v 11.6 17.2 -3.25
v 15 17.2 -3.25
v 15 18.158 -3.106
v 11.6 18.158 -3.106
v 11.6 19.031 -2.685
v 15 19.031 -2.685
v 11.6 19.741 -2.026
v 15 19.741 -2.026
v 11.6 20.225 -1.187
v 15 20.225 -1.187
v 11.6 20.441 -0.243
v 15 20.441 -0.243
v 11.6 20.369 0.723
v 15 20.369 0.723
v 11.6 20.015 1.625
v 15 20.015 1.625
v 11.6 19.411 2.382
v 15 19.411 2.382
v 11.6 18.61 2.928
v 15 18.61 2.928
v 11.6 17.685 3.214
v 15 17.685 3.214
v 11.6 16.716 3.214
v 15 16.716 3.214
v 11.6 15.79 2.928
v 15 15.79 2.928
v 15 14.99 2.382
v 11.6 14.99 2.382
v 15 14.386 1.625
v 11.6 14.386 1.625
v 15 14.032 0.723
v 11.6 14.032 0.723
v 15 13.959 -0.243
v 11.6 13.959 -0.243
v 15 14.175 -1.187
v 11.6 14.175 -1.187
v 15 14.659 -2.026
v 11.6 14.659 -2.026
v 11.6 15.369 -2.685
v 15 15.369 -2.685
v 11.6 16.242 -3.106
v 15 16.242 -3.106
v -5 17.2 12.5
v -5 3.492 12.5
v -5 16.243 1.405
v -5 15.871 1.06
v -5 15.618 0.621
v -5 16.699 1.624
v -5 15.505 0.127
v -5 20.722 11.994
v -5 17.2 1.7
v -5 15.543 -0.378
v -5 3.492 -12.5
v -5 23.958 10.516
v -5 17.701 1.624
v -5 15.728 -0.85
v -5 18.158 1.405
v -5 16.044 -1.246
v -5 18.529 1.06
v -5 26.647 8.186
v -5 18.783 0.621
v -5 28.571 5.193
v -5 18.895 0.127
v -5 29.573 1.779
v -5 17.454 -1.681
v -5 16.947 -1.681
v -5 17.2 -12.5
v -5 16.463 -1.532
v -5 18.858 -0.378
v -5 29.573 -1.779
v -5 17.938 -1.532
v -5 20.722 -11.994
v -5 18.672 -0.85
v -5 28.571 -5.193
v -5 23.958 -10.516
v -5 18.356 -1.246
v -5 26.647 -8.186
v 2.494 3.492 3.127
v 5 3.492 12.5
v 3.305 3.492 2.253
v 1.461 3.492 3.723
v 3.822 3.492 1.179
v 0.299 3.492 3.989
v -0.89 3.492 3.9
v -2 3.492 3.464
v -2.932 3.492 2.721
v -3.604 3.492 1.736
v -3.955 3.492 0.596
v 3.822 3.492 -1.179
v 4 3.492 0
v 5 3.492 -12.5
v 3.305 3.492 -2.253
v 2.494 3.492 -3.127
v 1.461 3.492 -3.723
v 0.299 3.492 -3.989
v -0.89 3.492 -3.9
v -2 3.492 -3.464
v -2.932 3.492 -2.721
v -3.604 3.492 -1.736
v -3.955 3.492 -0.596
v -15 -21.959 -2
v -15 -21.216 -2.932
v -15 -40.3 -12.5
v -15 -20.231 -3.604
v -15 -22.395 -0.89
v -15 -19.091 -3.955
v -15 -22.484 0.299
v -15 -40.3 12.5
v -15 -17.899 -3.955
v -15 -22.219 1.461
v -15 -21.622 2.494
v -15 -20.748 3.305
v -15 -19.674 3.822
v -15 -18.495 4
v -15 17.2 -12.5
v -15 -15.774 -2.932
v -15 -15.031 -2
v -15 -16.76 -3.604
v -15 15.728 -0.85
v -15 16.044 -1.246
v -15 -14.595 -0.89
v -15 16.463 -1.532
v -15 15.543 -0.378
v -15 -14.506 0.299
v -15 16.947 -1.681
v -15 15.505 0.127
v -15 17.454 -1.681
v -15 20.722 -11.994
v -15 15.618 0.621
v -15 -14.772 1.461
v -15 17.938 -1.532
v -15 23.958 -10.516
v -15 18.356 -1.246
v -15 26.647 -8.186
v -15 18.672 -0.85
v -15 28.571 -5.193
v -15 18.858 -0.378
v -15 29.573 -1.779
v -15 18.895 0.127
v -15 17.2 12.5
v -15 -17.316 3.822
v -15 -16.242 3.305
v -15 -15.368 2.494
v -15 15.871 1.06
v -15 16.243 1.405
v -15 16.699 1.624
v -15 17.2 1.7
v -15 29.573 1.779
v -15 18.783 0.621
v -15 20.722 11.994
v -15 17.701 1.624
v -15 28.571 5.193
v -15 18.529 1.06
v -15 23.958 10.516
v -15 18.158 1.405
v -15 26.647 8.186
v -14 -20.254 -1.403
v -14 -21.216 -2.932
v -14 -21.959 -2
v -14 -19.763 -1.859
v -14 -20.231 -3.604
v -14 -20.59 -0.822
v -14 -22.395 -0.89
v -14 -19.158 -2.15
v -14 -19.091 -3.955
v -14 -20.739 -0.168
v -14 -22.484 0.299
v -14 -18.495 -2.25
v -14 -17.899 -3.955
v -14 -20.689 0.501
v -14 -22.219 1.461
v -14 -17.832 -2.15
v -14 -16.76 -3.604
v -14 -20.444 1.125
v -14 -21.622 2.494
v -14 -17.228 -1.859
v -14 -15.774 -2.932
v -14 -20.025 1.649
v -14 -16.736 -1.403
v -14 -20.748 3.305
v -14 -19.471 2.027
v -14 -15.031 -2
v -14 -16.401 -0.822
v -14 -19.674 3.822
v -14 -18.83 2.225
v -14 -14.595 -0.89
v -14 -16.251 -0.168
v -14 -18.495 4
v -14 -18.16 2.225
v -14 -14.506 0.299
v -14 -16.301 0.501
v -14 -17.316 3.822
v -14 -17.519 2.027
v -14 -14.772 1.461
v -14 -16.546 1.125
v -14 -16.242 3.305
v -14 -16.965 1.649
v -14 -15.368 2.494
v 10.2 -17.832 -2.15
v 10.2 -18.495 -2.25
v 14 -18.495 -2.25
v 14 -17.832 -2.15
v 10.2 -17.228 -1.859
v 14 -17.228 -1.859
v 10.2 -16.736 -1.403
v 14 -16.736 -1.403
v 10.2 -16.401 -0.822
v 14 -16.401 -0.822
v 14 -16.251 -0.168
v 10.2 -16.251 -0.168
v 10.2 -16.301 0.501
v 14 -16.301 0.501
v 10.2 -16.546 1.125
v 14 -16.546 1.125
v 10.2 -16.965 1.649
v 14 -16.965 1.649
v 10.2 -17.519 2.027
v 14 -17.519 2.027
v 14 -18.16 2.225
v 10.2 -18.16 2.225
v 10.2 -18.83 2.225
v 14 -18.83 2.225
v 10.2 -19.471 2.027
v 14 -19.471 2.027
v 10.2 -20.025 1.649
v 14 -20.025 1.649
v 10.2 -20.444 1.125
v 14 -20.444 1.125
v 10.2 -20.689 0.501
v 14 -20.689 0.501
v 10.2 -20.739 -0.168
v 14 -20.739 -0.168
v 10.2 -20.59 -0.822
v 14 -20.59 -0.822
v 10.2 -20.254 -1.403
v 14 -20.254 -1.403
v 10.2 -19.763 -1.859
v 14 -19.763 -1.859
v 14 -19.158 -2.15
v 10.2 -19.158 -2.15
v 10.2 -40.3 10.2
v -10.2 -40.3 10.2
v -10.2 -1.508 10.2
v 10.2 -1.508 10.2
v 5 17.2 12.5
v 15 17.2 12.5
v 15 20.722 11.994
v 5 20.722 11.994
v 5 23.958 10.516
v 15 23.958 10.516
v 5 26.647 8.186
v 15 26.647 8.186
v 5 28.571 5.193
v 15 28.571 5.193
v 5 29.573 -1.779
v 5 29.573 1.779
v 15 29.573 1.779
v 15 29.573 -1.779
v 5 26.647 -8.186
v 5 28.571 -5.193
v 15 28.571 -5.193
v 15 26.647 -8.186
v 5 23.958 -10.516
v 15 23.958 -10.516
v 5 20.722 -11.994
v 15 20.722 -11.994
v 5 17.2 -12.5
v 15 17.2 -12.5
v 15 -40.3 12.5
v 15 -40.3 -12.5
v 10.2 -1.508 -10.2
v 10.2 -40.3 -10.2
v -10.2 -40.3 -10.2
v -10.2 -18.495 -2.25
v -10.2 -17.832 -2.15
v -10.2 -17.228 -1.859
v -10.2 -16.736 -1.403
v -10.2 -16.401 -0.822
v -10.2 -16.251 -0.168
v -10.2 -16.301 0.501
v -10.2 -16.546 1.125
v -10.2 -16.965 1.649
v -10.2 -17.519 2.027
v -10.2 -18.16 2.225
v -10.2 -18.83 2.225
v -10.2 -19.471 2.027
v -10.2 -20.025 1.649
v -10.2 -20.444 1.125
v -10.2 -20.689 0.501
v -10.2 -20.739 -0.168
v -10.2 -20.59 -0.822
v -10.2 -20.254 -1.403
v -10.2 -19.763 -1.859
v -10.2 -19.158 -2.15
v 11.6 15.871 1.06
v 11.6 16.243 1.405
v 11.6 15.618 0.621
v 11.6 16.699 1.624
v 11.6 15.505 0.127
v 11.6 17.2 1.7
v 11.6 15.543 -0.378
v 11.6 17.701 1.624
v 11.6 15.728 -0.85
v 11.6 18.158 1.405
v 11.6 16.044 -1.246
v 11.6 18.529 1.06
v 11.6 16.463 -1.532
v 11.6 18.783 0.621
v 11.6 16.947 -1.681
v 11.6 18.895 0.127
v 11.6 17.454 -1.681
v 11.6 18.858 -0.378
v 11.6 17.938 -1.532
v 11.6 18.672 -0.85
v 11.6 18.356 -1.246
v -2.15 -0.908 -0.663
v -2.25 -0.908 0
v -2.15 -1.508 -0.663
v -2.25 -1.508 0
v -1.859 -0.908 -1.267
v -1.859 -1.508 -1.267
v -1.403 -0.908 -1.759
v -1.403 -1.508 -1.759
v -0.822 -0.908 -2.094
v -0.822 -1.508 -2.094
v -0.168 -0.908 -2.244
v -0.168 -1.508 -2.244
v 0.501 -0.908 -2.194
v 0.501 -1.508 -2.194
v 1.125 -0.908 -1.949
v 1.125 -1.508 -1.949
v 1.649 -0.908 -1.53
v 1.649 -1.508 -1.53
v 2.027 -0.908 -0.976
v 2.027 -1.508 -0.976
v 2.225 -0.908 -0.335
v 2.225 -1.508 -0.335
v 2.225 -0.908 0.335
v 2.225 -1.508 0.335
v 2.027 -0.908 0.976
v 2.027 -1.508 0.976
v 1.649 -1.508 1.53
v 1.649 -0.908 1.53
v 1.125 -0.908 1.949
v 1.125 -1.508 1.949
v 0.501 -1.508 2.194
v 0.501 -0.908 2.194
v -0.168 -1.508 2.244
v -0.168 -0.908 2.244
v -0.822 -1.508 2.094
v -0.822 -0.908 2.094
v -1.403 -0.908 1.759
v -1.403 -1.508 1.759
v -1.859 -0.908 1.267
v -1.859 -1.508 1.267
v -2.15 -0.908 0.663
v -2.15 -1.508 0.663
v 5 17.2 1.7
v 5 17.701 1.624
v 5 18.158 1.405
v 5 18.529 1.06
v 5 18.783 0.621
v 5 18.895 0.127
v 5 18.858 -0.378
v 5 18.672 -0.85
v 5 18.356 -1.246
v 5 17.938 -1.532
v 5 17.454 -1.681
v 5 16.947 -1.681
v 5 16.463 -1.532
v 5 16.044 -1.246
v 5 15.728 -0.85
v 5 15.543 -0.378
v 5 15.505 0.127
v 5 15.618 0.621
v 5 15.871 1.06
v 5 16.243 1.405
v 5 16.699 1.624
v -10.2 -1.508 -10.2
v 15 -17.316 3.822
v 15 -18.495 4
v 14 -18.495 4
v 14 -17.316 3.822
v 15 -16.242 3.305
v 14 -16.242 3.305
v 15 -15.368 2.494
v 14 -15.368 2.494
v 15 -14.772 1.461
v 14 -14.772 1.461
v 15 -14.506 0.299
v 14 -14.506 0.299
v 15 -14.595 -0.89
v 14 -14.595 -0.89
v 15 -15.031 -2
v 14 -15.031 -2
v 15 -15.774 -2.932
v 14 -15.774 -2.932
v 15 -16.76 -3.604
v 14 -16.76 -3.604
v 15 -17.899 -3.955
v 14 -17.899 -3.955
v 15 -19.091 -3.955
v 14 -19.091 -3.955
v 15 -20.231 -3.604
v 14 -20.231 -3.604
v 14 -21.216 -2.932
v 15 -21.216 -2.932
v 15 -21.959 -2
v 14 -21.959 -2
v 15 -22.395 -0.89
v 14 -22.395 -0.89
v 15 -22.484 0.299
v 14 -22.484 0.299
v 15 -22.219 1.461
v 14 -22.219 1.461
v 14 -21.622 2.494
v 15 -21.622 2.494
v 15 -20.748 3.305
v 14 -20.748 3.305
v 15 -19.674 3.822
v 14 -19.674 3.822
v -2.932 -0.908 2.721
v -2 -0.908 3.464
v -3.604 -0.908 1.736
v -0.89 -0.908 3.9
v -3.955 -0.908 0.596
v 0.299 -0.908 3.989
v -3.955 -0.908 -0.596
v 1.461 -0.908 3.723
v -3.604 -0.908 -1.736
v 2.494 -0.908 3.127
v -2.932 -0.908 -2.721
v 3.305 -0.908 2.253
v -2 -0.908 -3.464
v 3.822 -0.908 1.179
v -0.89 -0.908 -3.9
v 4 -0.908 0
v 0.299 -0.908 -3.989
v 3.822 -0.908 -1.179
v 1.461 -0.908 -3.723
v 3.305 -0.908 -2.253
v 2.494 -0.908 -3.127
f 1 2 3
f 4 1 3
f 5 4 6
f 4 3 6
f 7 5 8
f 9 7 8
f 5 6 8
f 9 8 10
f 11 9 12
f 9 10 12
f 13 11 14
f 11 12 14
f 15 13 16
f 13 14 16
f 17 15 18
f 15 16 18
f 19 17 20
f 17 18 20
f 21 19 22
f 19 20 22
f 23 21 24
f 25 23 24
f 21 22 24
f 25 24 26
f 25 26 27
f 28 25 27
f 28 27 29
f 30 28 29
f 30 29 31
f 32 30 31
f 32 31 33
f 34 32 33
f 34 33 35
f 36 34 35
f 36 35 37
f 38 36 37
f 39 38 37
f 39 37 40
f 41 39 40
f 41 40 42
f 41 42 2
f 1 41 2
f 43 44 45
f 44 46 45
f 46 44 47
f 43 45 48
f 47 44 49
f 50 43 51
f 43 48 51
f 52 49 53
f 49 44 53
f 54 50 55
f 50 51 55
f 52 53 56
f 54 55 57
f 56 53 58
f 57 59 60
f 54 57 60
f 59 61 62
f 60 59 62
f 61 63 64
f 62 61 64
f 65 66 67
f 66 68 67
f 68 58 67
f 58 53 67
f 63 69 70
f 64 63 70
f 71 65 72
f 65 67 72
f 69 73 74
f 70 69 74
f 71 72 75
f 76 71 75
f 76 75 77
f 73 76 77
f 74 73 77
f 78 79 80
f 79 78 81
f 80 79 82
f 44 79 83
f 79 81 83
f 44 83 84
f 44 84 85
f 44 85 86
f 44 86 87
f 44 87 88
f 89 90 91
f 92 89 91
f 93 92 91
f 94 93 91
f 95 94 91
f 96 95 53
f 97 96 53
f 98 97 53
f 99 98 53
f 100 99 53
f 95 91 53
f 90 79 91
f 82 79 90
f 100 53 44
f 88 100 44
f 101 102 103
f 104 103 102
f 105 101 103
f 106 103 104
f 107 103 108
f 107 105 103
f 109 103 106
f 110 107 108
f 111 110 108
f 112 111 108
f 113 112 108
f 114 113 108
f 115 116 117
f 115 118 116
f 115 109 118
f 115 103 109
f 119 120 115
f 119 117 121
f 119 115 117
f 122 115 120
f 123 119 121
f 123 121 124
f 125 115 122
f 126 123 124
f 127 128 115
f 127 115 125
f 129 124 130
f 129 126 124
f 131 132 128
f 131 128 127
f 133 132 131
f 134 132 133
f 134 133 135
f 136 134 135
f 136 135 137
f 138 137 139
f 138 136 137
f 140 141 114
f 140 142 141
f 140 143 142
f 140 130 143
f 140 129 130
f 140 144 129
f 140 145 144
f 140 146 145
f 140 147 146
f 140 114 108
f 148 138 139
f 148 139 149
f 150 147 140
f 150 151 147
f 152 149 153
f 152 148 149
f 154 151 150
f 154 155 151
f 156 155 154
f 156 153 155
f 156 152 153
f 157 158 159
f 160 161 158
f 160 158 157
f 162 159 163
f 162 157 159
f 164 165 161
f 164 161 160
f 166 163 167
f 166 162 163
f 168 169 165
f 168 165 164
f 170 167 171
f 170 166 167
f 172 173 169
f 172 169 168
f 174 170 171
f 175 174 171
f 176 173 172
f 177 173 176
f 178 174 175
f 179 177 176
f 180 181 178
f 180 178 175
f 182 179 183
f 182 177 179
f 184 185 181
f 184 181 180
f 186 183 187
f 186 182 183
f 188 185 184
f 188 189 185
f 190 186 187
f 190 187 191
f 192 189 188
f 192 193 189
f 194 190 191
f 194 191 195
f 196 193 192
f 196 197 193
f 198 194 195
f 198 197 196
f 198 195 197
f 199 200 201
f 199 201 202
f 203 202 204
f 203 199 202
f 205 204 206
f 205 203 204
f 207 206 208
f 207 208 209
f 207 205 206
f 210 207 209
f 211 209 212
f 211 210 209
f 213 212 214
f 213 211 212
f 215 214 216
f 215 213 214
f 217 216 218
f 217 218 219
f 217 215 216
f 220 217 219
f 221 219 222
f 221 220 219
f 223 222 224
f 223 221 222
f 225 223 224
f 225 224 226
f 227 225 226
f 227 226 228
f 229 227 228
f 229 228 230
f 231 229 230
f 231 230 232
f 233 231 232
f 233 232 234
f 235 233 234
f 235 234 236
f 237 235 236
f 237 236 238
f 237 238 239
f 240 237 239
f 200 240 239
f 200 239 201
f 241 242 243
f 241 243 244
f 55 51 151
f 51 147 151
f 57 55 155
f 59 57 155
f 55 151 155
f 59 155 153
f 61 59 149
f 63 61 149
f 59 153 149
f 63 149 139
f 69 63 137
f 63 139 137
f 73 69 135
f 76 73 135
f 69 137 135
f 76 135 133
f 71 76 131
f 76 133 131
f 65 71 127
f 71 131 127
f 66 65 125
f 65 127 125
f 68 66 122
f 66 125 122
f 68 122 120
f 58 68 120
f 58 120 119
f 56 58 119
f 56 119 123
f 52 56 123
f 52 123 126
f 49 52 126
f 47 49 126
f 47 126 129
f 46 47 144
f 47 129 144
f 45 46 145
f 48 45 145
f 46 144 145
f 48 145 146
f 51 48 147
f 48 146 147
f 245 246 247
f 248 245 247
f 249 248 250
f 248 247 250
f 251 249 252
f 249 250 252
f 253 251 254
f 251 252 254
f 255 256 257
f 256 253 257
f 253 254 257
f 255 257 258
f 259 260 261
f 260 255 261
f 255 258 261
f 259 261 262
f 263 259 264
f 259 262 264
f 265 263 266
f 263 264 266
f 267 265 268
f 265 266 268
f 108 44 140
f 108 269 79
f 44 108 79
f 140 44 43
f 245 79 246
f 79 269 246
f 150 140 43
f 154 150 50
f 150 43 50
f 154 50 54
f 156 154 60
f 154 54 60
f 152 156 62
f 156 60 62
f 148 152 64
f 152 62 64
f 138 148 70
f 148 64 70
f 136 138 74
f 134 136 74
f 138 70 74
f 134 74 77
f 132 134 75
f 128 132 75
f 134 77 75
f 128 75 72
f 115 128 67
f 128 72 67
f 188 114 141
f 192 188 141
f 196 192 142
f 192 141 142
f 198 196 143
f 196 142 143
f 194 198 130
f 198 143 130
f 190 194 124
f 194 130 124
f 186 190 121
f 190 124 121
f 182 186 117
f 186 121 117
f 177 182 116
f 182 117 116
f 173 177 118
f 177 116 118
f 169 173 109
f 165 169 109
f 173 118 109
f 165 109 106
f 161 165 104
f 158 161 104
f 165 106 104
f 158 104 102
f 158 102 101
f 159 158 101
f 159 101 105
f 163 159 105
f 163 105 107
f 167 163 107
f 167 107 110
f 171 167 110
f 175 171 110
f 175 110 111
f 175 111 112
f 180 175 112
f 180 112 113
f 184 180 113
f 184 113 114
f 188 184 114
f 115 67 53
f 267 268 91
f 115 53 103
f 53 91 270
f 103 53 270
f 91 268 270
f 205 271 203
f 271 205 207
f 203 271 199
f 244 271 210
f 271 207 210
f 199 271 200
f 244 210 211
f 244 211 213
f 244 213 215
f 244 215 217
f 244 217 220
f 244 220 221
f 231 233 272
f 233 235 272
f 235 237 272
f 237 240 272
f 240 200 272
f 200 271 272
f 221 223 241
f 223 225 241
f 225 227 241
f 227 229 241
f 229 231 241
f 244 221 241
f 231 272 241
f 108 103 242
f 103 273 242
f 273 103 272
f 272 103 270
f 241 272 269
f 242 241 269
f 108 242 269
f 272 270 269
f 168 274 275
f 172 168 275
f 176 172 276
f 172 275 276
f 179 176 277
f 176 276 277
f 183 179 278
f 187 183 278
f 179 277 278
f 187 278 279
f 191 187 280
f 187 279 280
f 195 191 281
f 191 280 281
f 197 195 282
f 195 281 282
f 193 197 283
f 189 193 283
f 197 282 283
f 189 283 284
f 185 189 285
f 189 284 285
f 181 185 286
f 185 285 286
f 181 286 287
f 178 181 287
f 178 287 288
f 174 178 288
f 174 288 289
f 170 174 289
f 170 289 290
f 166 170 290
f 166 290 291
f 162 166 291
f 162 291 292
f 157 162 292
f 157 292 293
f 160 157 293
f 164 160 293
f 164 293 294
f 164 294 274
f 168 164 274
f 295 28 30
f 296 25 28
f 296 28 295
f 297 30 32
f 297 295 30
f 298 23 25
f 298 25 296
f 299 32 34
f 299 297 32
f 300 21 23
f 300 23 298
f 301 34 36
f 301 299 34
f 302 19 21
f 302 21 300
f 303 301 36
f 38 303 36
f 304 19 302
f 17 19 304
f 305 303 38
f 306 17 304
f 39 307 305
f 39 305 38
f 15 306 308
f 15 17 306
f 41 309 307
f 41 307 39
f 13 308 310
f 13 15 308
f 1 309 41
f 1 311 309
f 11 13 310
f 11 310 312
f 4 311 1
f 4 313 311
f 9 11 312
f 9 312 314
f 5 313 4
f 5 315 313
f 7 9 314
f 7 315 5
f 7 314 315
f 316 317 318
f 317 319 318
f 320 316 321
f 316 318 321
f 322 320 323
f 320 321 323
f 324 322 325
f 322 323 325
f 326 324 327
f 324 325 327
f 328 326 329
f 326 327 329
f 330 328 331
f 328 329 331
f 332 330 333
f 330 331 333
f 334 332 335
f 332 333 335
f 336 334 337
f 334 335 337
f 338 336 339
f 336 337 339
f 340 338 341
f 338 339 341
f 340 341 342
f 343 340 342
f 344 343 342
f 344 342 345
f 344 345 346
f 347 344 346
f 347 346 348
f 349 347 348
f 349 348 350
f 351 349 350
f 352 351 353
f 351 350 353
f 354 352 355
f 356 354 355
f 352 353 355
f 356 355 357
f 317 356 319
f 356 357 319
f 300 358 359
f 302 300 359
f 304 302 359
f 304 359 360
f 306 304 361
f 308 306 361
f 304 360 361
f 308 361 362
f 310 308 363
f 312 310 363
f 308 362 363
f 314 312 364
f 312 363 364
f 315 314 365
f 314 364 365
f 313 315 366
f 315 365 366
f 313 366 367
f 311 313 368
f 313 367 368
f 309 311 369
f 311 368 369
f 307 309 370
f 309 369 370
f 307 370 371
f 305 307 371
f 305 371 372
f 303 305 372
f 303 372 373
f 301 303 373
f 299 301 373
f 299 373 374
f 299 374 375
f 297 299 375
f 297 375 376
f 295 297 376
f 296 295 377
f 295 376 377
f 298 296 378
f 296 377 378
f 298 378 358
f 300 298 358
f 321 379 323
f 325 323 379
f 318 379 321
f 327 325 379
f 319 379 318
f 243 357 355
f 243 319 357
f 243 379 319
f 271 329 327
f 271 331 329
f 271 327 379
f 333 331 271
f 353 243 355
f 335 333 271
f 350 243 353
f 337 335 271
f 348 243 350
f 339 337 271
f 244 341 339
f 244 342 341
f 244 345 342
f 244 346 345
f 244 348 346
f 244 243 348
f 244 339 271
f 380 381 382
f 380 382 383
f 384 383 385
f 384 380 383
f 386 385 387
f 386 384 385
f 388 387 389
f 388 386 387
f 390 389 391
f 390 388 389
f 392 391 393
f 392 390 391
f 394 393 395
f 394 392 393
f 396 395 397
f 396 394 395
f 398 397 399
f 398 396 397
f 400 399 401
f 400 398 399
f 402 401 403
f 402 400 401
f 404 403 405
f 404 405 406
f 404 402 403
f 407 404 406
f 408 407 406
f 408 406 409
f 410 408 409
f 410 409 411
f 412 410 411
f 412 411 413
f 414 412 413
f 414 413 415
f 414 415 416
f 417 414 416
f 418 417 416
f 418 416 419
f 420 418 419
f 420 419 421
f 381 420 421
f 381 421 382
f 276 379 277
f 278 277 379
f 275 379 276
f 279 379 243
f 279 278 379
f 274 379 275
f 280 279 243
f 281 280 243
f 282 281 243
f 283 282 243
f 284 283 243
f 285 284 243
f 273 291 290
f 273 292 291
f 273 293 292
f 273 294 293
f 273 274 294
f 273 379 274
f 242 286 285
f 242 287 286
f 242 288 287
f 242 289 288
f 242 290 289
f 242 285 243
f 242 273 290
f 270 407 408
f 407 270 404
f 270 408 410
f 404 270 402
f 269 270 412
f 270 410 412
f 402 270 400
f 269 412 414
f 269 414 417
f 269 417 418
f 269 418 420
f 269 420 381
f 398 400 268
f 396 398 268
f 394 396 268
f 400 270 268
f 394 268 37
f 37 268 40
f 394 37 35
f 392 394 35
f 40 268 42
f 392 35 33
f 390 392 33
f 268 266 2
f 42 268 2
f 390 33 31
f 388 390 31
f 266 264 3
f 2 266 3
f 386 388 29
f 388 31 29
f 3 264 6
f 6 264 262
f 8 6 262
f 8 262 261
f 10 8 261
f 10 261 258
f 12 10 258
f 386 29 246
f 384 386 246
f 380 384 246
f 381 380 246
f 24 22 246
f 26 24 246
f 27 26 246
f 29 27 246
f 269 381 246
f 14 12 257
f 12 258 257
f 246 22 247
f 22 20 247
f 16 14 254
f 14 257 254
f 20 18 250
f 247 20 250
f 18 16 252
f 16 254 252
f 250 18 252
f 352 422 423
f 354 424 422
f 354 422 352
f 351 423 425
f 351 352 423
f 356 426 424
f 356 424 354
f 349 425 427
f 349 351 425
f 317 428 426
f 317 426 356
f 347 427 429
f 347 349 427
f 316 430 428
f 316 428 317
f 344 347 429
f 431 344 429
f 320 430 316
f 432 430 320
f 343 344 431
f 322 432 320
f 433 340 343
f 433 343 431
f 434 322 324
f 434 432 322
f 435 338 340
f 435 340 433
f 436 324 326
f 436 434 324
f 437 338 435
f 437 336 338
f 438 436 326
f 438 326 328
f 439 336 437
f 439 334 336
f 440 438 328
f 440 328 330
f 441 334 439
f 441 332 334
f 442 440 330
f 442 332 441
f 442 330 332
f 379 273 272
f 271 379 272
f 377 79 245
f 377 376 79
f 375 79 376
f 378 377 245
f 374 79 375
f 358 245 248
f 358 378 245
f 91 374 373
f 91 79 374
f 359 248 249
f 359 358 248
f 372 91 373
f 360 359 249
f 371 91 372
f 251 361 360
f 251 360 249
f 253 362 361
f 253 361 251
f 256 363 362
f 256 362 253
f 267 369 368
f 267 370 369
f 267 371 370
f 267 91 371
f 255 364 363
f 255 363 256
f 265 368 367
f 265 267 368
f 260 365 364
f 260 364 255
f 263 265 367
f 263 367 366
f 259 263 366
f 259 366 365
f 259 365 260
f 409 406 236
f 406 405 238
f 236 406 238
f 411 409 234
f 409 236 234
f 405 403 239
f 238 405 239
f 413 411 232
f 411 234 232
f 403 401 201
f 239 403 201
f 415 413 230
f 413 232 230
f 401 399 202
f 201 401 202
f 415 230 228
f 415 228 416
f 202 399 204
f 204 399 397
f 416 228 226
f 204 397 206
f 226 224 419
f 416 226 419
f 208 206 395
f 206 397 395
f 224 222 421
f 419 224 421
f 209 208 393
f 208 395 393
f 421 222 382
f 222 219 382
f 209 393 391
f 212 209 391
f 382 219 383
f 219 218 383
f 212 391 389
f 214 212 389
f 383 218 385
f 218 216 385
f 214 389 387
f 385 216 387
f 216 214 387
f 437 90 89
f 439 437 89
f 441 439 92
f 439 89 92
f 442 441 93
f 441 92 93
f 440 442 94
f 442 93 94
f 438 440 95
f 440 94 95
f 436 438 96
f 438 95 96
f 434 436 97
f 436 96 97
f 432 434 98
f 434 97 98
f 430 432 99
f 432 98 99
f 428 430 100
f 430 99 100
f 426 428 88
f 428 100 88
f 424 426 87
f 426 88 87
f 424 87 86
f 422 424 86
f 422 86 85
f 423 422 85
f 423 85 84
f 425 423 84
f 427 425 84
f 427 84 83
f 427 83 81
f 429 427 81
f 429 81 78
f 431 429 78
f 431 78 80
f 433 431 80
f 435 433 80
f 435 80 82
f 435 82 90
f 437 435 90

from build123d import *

# Parameters (mm, degrees)
BOSS_EXTRU_1_DEPTH                                 = 15
CHAMBRAGE_POUR_VIS_T_TE_HEXAGONALE_M31_D           = 3.4
CHAMBRAGE_POUR_VIS_T_TE_HEXAGONALE_M31_CBORE_D     = 6.5
CHAMBRAGE_POUR_VIS_T_TE_HEXAGONALE_M31_CBORE_DEPTH = 3.4
ENL_V_MAT_EXTRU_2_REACH                            = 51.74
ESQUISSE3_W                                        = 10
ESQUISSE3_H                                        = 26.208058997
ESQUISSE2_W                                        = 20.4
ESQUISSE2_H                                        = 20.4
ENL_V_MAT_EXTRU_1_DEPTH                            = 38.791941003
CHAMBRAGE_POUR_VIS_T_TE_HEXAGONALE_M42_D           = 4.5
CHAMBRAGE_POUR_VIS_T_TE_HEXAGONALE_M42_DEPTH       = 4.8
CHAMBRAGE_POUR_VIS_T_TE_HEXAGONALE_M42_CBORE_D     = 8
CHAMBRAGE_POUR_VIS_T_TE_HEXAGONALE_M42_CBORE_DEPTH = 1
CHAMBRAGE_POUR_VIS_T_TE_HEXAGONALE_M43_D           = 4.5
CHAMBRAGE_POUR_VIS_T_TE_HEXAGONALE_M43_CBORE_D     = 8
CHAMBRAGE_POUR_VIS_T_TE_HEXAGONALE_M43_CBORE_DEPTH = 4.4


with BuildPart() as part:
    # Esquisse1 → Boss.-Extru.1 (new, symmetric)
    with BuildSketch(Plane(origin=(0, 0, 0), x_dir=(0, 0, -1), z_dir=(1, 0, 0))):
        with BuildLine():
            Line((-12.5, -40.299852287), (-12.5, 17.200147713))
            ThreePointArc((-12.5, 17.200147713), (0, 29.700147713), (12.5, 17.200147713))
            Line((12.5, 17.200147713), (12.5, -40.299852287))
            Line((12.5, -40.299852287), (-12.5, -40.299852287))
        make_face()
    extrude(amount=BOSS_EXTRU_1_DEPTH, both=True)

    # Chambrage pour vis à tête hexagonale M31 (through all)
    with Locations(Plane(origin=(15, 0, 0), x_dir=(0, 0, -1), z_dir=(1, 0, 0))):
        with Locations((0, 17.200147713)):
            CounterBoreHole(CHAMBRAGE_POUR_VIS_T_TE_HEXAGONALE_M31_D / 2, CHAMBRAGE_POUR_VIS_T_TE_HEXAGONALE_M31_CBORE_D / 2, CHAMBRAGE_POUR_VIS_T_TE_HEXAGONALE_M31_CBORE_DEPTH)

    # Esquisse3 → Enlèv. mat.-Extru.2 (cut, up to next)
    with BuildSketch(Plane(origin=(0, 0, -12.5), x_dir=(-1, 0, 0), z_dir=(0, 0, -1)), mode=Mode.PRIVATE) as enl_v_mat_extru_2_sk1:
        with Locations((0, 16.596118215)):
            Rectangle(ESQUISSE3_W, ESQUISSE3_H)
    enl_v_mat_extru_2_tool1 = extrude(enl_v_mat_extru_2_sk1.sketch, amount=-ENL_V_MAT_EXTRU_2_REACH, mode=Mode.PRIVATE) & part.part
    add(enl_v_mat_extru_2_tool1.solids().sort_by_distance((0, 16.596118, -12.5))[0], mode=Mode.SUBTRACT)

    # Esquisse2 → Enlèv. mat.-Extru.1 (cut)
    with BuildSketch(Plane.XZ.offset(40.299852287)):
        Rectangle(ESQUISSE2_W, ESQUISSE2_H)
    extrude(amount=-ENL_V_MAT_EXTRU_1_DEPTH, mode=Mode.SUBTRACT)

    # Chambrage pour vis à tête hexagonale M42
    with Locations(Plane.ZY.offset(15)):
        with Locations((0, -18.495042181)):
            chambrage_pour_vis_t_te_hexagonale_m42 = CounterBoreHole(CHAMBRAGE_POUR_VIS_T_TE_HEXAGONALE_M42_D / 2, CHAMBRAGE_POUR_VIS_T_TE_HEXAGONALE_M42_CBORE_D / 2, CHAMBRAGE_POUR_VIS_T_TE_HEXAGONALE_M42_CBORE_DEPTH, depth=CHAMBRAGE_POUR_VIS_T_TE_HEXAGONALE_M42_DEPTH)

    # Chambrage pour vis à tête hexagonale M43 (through all)
    with Locations(Plane(origin=(0, 3.492088716, 0), x_dir=(1, 0, 0), z_dir=(0, 1, 0))):
        with Locations((0, 0)):
            CounterBoreHole(CHAMBRAGE_POUR_VIS_T_TE_HEXAGONALE_M43_D / 2, CHAMBRAGE_POUR_VIS_T_TE_HEXAGONALE_M43_CBORE_D / 2, CHAMBRAGE_POUR_VIS_T_TE_HEXAGONALE_M43_CBORE_DEPTH)

    # Symétrie1: Chambrage pour vis à tête hexagonale M42 across plane
    add(chambrage_pour_vis_t_te_hexagonale_m42.mirror(Plane(origin=(0, 0, 0), x_dir=(0, 0, 1), z_dir=(1, 0, 0))), mode=Mode.SUBTRACT)


solid = part.part
